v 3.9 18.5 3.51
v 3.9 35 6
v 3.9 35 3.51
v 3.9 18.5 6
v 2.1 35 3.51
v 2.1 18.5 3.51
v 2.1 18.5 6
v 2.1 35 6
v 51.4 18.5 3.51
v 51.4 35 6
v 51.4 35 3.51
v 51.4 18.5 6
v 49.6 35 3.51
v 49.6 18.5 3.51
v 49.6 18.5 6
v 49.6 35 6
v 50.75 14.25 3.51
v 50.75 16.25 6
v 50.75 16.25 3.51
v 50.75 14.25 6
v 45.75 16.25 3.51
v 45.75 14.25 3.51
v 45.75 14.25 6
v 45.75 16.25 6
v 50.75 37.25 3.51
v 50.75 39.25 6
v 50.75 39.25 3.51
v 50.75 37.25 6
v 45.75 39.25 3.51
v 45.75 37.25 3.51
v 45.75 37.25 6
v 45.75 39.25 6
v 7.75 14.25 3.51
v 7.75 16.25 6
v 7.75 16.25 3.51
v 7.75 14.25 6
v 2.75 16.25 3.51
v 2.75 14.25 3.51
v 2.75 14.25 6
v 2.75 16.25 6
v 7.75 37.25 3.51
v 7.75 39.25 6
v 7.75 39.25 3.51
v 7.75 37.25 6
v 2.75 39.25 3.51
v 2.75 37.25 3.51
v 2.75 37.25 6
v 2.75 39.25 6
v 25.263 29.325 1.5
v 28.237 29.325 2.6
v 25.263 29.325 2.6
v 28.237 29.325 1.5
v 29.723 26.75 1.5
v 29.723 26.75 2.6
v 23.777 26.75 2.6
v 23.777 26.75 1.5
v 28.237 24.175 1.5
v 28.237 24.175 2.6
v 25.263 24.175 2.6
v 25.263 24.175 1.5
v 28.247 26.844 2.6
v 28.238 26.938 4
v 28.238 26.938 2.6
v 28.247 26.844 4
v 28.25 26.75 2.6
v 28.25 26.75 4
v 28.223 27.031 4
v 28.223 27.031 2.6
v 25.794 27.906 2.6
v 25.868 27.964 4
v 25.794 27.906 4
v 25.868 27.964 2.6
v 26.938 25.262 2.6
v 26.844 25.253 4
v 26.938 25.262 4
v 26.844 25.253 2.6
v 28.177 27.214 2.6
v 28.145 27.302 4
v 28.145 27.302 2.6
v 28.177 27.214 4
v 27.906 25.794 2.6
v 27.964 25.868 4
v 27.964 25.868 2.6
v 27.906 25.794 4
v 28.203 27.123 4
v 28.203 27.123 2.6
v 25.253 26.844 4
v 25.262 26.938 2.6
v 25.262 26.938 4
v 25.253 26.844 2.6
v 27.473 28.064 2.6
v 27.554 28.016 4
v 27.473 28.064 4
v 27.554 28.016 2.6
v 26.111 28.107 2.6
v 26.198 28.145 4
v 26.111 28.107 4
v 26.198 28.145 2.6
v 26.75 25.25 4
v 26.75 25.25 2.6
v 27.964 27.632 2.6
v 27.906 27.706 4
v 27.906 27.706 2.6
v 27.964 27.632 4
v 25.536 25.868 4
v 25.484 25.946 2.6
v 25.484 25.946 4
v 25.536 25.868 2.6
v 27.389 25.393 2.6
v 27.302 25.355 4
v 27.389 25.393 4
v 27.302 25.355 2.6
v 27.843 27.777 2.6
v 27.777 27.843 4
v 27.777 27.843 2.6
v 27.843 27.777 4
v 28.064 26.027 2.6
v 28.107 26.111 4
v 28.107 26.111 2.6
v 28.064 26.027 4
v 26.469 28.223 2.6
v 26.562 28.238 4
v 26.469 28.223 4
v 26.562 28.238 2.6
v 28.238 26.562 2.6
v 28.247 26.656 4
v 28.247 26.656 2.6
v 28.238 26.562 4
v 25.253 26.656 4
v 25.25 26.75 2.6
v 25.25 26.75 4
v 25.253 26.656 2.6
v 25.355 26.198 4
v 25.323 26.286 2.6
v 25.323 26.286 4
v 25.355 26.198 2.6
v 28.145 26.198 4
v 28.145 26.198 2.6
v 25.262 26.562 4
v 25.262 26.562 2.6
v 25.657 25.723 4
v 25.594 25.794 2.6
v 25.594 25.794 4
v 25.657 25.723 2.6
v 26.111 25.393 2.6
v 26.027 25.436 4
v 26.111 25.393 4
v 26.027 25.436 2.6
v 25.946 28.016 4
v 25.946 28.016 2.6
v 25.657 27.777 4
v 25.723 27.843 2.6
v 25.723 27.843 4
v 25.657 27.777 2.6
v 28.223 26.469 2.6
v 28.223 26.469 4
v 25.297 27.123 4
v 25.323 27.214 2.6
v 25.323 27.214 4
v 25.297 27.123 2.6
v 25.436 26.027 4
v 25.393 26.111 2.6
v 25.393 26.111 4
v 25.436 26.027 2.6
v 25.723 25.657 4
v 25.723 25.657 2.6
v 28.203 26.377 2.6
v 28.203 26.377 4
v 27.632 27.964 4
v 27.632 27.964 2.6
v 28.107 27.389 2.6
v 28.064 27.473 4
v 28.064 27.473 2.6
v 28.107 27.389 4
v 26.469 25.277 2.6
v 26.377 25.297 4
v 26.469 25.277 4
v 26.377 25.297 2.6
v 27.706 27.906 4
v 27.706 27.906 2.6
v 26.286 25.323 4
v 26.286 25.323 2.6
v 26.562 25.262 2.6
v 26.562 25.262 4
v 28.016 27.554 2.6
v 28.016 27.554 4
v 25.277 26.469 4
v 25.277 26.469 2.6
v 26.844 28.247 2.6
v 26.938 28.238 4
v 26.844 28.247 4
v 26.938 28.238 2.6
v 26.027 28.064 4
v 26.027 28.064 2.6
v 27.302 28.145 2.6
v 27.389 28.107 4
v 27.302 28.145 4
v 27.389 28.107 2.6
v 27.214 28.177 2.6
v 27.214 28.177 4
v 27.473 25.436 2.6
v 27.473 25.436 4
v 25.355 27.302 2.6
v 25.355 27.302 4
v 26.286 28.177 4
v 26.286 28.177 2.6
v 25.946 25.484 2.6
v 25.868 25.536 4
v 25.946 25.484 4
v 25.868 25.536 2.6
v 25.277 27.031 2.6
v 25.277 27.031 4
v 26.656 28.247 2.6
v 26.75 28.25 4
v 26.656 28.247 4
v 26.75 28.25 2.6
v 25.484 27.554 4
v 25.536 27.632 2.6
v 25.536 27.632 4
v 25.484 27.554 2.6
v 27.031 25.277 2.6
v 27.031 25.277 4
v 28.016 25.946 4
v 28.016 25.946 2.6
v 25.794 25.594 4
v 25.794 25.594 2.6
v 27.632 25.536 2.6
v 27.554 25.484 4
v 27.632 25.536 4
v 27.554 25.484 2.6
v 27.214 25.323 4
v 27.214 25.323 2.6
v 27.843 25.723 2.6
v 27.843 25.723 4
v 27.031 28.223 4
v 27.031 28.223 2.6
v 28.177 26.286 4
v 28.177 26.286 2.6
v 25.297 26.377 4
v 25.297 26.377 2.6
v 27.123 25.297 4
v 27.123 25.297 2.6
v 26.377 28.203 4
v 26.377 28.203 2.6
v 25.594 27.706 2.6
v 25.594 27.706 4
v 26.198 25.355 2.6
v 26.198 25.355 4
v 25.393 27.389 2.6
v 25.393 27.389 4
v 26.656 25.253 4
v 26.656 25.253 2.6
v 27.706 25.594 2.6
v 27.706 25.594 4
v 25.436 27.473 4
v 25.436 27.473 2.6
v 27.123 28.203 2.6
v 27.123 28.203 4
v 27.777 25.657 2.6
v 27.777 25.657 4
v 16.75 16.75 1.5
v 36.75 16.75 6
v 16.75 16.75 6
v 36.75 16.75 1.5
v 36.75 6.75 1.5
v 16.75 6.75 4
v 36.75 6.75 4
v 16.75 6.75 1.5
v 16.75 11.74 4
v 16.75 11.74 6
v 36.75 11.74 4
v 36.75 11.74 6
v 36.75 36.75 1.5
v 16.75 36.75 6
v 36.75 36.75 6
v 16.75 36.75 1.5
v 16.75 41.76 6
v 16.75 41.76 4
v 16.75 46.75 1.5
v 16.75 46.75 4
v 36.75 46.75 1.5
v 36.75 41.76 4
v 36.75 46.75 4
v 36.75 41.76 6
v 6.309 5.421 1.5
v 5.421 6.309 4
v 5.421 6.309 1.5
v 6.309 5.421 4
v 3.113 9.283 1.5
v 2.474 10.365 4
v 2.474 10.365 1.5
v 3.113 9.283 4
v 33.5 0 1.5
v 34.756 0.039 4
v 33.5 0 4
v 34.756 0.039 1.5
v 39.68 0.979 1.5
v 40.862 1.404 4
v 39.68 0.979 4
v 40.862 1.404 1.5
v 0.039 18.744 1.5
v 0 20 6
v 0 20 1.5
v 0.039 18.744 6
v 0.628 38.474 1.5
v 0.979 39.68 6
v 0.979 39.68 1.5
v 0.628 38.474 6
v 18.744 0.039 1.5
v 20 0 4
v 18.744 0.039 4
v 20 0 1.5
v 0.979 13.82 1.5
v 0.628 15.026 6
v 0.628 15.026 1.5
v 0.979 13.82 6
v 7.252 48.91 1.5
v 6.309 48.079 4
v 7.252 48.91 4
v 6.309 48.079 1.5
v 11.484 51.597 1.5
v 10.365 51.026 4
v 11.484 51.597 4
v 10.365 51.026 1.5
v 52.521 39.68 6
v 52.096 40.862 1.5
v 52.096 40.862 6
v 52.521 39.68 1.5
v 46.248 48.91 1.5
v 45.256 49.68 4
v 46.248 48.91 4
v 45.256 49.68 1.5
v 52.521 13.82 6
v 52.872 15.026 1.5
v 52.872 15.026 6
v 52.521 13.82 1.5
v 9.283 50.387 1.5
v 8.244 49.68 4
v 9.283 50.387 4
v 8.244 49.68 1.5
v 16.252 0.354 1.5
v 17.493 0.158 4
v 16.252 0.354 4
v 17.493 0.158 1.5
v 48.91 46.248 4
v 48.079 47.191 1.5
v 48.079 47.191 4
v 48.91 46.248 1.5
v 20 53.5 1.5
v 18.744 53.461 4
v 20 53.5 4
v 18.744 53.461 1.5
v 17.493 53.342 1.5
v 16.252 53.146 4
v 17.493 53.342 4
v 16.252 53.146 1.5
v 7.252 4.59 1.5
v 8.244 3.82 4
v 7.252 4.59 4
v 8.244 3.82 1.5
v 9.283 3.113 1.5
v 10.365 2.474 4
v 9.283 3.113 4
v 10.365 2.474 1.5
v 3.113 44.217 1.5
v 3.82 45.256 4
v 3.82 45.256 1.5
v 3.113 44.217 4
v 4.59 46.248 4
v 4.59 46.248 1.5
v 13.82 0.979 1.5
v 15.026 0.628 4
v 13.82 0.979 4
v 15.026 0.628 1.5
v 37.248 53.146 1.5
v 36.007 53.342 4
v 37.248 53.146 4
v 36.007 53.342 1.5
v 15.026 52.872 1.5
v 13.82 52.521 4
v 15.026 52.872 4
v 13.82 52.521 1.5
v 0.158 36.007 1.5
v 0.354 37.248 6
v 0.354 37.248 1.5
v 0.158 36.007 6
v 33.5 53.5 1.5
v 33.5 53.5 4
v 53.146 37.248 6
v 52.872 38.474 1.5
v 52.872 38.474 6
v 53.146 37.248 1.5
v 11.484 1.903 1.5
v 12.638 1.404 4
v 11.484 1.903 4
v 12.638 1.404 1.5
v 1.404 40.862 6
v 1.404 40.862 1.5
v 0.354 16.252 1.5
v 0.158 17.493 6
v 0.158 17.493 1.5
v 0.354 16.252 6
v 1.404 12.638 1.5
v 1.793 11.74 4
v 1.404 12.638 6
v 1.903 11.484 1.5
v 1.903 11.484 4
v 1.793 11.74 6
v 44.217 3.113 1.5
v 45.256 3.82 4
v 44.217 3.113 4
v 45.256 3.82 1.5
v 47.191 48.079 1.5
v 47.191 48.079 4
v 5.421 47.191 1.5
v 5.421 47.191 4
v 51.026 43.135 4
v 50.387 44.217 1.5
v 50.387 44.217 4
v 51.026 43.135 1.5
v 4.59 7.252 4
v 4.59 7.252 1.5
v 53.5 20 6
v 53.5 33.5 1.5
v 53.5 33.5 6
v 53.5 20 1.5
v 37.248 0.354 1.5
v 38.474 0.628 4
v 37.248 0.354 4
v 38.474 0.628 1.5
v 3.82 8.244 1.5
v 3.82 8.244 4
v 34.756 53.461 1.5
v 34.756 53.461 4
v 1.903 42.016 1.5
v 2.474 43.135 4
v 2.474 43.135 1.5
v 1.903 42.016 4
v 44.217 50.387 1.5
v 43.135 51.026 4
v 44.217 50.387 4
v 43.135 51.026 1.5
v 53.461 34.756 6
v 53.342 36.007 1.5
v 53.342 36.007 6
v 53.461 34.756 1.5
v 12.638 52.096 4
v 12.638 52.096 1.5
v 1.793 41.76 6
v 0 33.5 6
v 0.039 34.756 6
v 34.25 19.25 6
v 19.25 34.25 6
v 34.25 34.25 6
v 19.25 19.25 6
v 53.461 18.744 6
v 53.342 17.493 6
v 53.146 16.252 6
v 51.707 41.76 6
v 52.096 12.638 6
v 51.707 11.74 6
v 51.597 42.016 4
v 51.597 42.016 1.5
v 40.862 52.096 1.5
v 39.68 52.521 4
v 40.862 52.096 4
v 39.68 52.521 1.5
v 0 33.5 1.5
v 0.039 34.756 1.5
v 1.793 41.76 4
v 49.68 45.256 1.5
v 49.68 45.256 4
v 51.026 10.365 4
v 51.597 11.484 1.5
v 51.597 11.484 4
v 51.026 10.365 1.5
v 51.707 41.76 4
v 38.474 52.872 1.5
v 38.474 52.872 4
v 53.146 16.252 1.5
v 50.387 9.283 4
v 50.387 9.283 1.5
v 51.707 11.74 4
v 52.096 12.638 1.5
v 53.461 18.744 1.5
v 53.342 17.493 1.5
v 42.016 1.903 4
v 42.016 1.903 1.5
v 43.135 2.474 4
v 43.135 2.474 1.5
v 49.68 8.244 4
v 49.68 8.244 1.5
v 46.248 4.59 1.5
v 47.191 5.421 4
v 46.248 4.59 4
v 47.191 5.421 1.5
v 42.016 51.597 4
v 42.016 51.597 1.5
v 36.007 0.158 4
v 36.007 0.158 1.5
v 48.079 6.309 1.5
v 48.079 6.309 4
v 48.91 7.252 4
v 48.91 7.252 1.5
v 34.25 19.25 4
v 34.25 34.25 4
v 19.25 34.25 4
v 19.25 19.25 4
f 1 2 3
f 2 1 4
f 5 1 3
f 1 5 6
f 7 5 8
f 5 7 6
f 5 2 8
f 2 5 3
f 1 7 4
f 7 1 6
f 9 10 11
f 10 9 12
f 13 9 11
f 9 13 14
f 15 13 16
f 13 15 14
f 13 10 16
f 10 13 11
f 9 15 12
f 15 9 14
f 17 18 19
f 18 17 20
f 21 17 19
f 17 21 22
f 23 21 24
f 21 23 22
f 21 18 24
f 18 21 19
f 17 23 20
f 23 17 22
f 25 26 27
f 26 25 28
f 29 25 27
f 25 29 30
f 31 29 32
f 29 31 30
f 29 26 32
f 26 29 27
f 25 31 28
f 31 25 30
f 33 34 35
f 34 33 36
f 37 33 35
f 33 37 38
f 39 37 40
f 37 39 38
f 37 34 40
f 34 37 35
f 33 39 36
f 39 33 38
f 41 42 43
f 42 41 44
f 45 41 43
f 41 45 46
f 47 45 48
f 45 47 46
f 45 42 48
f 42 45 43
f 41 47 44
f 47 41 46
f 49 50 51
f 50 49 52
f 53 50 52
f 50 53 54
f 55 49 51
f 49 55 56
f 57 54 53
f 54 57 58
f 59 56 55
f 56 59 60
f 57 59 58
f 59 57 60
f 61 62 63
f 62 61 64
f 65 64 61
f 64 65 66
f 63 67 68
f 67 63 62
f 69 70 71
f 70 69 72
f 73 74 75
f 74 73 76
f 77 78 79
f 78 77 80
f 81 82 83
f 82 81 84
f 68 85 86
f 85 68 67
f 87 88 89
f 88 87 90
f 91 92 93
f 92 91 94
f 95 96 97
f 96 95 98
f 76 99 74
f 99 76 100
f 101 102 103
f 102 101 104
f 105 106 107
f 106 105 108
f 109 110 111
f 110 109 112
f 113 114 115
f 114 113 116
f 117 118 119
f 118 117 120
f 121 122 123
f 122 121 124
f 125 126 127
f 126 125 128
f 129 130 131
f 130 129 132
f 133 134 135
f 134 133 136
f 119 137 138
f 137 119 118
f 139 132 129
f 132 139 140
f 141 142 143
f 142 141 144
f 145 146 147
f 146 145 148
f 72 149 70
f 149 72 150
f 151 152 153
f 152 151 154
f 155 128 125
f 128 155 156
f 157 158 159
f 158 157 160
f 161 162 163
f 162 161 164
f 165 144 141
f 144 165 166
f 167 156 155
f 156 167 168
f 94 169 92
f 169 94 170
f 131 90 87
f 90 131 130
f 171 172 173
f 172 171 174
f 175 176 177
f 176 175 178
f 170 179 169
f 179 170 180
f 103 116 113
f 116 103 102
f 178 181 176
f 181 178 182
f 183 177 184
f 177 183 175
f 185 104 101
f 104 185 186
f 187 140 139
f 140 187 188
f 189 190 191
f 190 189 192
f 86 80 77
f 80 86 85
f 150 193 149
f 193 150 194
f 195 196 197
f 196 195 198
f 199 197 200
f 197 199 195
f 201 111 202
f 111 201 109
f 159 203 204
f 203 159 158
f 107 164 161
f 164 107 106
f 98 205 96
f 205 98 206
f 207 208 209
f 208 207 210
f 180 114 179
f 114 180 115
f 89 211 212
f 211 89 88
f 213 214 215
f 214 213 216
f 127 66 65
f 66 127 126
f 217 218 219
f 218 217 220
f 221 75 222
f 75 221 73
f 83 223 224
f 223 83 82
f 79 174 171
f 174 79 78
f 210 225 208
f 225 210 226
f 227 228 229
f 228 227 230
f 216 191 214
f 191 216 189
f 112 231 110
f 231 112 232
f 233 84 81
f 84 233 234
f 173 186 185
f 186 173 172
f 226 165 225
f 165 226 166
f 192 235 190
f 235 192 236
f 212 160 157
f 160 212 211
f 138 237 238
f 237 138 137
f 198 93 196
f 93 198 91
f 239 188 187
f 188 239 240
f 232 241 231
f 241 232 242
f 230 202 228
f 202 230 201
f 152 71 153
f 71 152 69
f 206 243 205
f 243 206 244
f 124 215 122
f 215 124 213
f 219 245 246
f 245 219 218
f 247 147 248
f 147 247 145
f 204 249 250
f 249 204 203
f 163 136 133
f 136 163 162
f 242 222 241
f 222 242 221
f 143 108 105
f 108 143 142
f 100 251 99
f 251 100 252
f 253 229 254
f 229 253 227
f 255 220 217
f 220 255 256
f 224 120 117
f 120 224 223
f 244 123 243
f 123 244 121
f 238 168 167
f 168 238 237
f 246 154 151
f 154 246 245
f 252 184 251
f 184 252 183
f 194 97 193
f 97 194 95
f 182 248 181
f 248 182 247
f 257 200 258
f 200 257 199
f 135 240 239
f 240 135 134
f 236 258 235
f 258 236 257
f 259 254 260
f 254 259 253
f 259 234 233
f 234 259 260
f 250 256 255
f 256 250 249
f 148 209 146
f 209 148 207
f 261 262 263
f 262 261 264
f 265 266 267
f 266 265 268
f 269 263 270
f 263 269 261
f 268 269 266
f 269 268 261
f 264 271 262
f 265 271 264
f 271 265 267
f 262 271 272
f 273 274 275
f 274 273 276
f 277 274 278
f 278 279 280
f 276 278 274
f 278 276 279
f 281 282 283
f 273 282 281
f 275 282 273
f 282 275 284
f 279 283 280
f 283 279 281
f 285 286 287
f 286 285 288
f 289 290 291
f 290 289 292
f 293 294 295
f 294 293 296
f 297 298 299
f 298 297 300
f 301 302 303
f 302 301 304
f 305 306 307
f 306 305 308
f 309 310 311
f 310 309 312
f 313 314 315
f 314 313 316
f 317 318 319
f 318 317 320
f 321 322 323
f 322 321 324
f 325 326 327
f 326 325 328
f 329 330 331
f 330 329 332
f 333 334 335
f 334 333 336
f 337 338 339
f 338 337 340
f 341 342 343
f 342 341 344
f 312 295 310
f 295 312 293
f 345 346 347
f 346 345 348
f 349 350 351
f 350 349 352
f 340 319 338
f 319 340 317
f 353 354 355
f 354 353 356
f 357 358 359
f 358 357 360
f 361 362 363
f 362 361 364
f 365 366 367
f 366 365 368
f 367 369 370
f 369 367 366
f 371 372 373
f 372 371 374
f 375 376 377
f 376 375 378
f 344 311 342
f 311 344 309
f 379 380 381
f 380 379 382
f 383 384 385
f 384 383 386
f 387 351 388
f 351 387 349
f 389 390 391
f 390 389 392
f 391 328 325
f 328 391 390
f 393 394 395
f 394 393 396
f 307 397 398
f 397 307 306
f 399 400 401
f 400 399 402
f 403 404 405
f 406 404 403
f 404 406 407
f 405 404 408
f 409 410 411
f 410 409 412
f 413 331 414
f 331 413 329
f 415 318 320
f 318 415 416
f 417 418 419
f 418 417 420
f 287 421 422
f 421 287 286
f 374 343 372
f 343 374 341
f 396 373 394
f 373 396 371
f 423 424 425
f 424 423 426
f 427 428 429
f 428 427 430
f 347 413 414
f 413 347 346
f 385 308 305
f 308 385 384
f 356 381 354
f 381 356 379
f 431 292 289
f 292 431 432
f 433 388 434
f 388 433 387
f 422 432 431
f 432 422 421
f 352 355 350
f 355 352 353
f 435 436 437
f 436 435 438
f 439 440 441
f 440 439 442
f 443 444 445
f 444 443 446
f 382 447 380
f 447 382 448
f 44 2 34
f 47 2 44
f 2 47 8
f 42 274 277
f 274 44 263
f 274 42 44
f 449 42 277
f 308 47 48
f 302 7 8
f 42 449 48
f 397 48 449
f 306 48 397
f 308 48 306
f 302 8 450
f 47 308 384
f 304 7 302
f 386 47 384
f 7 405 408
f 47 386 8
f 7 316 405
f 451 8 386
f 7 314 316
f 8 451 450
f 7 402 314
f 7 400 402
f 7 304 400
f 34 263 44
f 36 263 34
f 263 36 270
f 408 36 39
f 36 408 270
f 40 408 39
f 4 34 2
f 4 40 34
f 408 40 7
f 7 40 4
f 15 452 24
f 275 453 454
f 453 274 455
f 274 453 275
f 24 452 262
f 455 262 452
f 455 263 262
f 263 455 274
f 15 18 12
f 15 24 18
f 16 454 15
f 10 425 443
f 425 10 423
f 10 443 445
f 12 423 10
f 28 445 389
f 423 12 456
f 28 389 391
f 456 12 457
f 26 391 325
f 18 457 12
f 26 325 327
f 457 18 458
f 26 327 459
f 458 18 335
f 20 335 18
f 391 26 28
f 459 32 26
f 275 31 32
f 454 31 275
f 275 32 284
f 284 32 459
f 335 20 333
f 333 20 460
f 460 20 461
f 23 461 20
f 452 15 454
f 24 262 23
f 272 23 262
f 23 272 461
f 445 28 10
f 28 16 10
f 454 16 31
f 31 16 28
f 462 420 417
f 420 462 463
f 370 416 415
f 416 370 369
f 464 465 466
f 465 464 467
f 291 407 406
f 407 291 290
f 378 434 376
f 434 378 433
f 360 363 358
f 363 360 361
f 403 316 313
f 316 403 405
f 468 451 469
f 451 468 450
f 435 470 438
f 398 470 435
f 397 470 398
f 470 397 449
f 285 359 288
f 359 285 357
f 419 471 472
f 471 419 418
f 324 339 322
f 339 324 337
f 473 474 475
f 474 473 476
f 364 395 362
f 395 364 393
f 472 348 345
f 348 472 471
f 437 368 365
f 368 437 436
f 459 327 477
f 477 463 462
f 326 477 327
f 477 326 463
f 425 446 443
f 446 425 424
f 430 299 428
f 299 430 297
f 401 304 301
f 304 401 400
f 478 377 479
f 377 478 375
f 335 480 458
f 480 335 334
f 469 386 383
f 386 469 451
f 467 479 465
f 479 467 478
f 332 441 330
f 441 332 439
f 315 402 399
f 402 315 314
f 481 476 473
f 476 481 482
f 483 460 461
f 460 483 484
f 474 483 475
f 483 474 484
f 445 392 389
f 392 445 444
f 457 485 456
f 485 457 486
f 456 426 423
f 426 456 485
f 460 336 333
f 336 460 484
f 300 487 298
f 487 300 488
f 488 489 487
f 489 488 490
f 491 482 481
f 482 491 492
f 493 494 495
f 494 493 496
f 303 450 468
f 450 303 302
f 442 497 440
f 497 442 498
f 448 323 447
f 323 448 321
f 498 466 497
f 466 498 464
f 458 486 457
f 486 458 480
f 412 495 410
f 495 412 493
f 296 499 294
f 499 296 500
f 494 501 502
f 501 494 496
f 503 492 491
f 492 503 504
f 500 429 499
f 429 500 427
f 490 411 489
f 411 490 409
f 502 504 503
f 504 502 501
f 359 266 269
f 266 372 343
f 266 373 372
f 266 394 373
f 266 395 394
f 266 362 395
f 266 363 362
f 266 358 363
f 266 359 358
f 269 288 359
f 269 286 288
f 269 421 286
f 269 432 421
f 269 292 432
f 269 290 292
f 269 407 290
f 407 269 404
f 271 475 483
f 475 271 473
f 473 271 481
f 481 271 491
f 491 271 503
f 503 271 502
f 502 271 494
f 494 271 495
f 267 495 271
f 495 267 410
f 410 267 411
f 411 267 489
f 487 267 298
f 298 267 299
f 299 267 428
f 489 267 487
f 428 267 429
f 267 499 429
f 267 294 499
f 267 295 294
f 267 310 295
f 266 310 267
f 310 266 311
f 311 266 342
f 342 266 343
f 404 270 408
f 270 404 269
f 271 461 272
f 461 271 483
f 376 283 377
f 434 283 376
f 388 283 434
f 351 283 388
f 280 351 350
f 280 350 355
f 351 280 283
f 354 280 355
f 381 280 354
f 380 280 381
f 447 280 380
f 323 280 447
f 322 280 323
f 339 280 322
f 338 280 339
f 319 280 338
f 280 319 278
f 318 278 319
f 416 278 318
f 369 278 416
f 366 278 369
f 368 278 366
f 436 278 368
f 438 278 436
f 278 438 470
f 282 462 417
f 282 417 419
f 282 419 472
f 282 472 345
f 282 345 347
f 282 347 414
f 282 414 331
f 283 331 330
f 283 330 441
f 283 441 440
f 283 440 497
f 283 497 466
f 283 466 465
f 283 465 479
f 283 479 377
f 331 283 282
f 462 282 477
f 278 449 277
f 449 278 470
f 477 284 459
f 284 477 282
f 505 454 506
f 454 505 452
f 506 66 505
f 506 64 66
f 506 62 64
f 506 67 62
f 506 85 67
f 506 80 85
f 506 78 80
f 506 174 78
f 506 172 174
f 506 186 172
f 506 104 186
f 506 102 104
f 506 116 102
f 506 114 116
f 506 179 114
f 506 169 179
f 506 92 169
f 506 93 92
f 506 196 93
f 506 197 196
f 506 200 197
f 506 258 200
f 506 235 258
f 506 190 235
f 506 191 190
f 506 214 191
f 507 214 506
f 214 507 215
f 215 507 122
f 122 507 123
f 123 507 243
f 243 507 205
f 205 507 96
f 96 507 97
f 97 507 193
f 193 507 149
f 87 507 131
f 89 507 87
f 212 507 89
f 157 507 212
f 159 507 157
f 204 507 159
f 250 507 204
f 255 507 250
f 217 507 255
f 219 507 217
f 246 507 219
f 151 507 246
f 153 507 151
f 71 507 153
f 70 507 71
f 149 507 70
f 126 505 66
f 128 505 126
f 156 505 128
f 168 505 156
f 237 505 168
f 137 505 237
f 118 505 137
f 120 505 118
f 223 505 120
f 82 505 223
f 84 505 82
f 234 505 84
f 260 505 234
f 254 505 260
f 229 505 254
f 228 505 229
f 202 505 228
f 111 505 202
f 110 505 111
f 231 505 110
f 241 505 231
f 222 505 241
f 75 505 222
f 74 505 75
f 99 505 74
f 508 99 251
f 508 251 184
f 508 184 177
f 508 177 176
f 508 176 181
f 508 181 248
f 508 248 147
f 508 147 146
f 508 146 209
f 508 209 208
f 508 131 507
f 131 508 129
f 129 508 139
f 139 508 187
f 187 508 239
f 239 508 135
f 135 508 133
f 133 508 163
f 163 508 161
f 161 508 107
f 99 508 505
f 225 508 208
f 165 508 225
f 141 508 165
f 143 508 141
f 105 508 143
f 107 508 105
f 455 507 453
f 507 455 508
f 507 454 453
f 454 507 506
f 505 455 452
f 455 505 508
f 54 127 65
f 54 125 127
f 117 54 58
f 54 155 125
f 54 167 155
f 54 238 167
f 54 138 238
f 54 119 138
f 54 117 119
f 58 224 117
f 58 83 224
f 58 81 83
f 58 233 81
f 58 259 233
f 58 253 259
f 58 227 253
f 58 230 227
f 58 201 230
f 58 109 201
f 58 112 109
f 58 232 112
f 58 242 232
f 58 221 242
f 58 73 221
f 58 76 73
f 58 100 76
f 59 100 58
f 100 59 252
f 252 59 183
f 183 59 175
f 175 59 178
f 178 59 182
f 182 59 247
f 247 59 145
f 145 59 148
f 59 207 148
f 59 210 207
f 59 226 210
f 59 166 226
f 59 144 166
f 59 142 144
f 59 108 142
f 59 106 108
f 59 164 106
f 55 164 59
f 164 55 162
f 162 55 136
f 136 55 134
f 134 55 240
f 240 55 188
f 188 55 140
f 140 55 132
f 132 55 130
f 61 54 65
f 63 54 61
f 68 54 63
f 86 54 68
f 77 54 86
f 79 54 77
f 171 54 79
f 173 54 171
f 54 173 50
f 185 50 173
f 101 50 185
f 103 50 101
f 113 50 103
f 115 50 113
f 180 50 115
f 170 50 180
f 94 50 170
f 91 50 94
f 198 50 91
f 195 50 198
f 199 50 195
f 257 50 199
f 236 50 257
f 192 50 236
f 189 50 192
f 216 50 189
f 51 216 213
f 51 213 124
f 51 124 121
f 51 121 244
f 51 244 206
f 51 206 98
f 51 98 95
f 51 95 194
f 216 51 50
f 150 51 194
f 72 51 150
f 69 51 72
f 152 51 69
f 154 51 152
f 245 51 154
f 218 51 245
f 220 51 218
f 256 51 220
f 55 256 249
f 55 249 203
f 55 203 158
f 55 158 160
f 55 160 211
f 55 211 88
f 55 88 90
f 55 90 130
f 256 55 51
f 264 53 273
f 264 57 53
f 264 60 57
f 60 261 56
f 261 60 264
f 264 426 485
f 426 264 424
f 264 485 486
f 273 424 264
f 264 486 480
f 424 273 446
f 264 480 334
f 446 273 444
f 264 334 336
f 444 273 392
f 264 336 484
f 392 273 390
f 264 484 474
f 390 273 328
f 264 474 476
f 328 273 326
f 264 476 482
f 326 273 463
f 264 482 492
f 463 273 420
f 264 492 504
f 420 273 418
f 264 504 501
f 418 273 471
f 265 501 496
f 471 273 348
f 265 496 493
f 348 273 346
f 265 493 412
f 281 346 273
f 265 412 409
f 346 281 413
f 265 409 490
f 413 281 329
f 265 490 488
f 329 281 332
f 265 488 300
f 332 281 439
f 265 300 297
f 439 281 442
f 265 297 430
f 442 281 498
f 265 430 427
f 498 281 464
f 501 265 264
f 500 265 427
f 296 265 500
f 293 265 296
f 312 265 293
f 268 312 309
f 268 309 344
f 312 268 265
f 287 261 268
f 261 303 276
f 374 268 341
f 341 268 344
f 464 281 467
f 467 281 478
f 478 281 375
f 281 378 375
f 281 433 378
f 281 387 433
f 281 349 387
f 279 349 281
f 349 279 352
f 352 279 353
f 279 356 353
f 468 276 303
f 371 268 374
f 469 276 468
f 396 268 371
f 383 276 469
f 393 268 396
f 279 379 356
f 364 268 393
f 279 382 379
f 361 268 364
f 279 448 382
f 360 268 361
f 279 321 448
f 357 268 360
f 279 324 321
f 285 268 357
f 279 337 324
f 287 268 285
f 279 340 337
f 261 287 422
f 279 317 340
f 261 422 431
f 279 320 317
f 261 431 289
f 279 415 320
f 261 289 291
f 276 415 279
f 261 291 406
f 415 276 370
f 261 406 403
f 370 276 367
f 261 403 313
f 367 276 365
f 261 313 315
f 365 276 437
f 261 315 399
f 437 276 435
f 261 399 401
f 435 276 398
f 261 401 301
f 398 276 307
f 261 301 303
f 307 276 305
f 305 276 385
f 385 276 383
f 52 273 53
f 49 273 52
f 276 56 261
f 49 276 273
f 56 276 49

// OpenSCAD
// file: backplate_v1.scad
use <./parts.scad>

module long_cutouts(distance=47.5,width=1.8,length=16.5, height=2.5) {
    translate([- distance/2 - width/2, - length/2, 0])
    translate([0, 0, 3.51]) {
        cube([width, length, height], center=false);

        translate([distance,0,0])
            cube([width, length, height], center=false);
    }
}

module short_cutouts(distance=43,distance_y=23,width=5,length=2, height=2.5) {
    translate([- distance/2 - width/2, -((distance_y+length)/2), 0])
        translate([0,0,3.51]) {
            {
                cube([width, length, height], center=false);

                translate([0, distance_y, 0])
                    cube([width, length, height], center=false);
            }

            translate([distance,0,0])
                {
                    cube([width, length, height], center=false);

                    translate([0, distance_y, 0])
                        cube([width, length, height], center=false);
                }
        }
}


module backplate(plate_size=53.5) {
    difference() {
        linear_extrude(height=6)
            rounded_rectangle(plate_size, plate_size, 20, fn=100);

        translate([plate_size/2 , plate_size/2, 0])
            long_cutouts();

        translate([plate_size/2 , plate_size/2, 0])
            short_cutouts();


        w1 = (plate_size - 30) / 2;
        translate([0,-0.01,4])
            cube([plate_size, w1, 5], center=false);

        translate([0,plate_size - w1 +.01,4])
            cube([plate_size, w1, 5], center=false);

        {
            translate([plate_size/2,plate_size/2,-.5]) {
                hexHole(flatToFlatDistance = M2_5(), depth=2.5);
                cylinder(d=3, h=50, center=false, $fn=100);
            }
        }

        translate([plate_size/2,plate_size/2,7.5 - 1])
            cube([15, 15, 5], center=true);

        // Magent cutouts
        translate([plate_size/2, plate_size/2-30/2, 3.51]) {
            rotate([0,0,90])
                cube([10, 20, 5], center=true);

            translate([0,30,0])
                rotate([0,0,90])
                    cube([10, 20, 5], center=true);
        }
    }
}
backplate();
// file: parts.scad
Mtolerance = 0.1;
M5size = 7.8;

function M5() = M5size + Mtolerance;

// Fits a standard M2.5 nut when printed with PLA the nut does not fall out
function M2_5_Pla() = 4.95 + Mtolerance;

// Fits a standard M2.5 nut. The nut falls out. Ideal for metal printing
function M2_5() = 5.05 + Mtolerance;

module hexHole(flatToFlatDistance, depth) {
    previewOptimize = 0.1;
    hexagonSide = flatToFlatDistance / (cos(30) * 2);

    translate([0, 0, -previewOptimize]) {
        linear_extrude(height=depth + previewOptimize * 2, center=false) {
            polygon(points=[
                    [hexagonSide, 0],
                    [hexagonSide / 2, sqrt(3) * hexagonSide / 2],
                    [-hexagonSide / 2, sqrt(3) * hexagonSide / 2],
                    [-hexagonSide, 0],
                    [-hexagonSide / 2, -sqrt(3) * hexagonSide / 2],
                    [hexagonSide / 2, -sqrt(3) * hexagonSide / 2]
                ]);
        }
    }
}

// Rounded rectangle module
module rounded_rectangle(width, length, r, fn=64) {
    // ensure radius doesn't exceed half of width/height
    rr = min(r, width/2, length/2);

    translate([rr, rr])
        offset(r=rr, $fn=fn)
            square([width - 2*rr, length - 2*rr]);

}
// main file
use <./parts.scad>
use <./backplate_v1.scad>

plate_size=53.5;
difference() {
    backplate(plate_size);

    cube([200, 200, 3], center=true);

    translate([plate_size/2,plate_size/2,0]) {
        hexHole(flatToFlatDistance = M2_5(), depth=2.5);
        cylinder(d=3, h=60, center=false, $fn=100);
    }
}
